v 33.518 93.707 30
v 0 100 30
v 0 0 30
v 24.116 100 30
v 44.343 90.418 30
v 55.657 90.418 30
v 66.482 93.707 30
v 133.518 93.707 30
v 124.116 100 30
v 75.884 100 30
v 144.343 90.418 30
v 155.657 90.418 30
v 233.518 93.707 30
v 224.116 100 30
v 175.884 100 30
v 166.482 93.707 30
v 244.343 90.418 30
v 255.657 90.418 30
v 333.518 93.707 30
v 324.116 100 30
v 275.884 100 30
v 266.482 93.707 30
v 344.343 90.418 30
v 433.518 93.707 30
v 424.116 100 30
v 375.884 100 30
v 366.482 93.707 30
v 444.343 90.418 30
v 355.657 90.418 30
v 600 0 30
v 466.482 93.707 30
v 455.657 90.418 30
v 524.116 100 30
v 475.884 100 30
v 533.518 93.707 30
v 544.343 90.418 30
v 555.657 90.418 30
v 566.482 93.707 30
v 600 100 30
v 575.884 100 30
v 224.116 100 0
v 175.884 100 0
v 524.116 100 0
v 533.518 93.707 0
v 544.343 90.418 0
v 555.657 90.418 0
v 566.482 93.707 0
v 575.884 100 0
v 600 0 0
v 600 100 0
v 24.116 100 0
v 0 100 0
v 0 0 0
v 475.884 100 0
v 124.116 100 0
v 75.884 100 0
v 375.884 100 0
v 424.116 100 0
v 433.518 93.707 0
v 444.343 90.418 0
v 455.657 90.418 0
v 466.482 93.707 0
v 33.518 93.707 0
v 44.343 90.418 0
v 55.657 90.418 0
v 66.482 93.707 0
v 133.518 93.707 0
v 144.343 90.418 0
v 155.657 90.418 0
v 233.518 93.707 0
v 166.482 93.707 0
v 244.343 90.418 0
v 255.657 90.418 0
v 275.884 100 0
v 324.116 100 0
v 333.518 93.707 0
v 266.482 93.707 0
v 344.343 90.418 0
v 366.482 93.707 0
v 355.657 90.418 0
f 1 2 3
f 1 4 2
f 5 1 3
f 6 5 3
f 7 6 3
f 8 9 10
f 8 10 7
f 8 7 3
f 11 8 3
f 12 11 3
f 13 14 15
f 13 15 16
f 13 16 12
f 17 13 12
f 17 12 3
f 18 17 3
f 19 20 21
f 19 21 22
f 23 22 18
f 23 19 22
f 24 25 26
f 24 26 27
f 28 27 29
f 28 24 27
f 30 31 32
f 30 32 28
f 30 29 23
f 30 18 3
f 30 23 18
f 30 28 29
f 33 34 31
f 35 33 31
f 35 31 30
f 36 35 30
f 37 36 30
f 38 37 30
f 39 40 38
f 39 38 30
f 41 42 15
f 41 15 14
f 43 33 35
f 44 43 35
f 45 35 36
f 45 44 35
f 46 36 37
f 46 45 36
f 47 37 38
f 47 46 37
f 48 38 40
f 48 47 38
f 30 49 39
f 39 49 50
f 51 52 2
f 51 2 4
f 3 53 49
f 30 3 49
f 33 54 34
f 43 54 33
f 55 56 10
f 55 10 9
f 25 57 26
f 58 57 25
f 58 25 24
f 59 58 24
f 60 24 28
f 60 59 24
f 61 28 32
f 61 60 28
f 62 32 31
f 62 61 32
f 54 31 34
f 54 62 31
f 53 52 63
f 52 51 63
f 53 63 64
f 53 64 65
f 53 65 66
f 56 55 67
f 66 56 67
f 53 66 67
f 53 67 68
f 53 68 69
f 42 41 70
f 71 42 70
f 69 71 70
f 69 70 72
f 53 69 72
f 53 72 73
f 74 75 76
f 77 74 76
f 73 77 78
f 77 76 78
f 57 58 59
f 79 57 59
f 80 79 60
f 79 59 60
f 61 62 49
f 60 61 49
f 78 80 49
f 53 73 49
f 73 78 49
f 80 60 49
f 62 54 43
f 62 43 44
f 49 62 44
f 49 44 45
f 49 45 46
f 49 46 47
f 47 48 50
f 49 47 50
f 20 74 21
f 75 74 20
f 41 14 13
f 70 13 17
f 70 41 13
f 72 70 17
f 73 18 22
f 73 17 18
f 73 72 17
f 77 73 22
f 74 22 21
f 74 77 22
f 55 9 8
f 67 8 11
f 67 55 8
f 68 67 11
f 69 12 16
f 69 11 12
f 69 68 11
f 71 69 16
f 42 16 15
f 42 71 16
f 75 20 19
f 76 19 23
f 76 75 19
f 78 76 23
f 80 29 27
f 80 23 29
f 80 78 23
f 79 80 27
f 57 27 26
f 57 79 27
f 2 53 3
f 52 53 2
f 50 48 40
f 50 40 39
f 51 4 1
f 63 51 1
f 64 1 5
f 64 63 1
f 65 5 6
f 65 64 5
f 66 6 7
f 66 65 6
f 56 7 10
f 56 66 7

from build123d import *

# Parameters (mm, degrees)
ESQUISSE1_W                  = 600
ESQUISSE1_H                  = 100
BOSS_EXTRU_1_DEPTH           = 30
ENL_V_MAT_EXTRU_1_DEPTH      = 610.015599143
ENL_V_MAT_EXTRU_1_DEPTH_BACK = 610.015599143
ESQUISSE2_R                  = 38.5


with BuildPart() as part:
    # Esquisse1 → Boss.-Extru.1 (new body)
    with BuildSketch(Plane.XY):
        with Locations((300, 50)):
            Rectangle(ESQUISSE1_W, ESQUISSE1_H)
    extrude(amount=BOSS_EXTRU_1_DEPTH)

    # Esquisse2 → Enlèv. mat.-Extru.1 (cut, two sides: drawn at the far end of the back side and taken through both)
    with BuildSketch(Plane.XY.offset(30).offset(-ENL_V_MAT_EXTRU_1_DEPTH_BACK)):
        with Locations((50, 128.5)):
            Circle(ESQUISSE2_R)
        with Locations((150, 128.5)):
            Circle(ESQUISSE2_R)
        with Locations((250, 128.5)):
            Circle(ESQUISSE2_R)
        with Locations((350, 128.5)):
            Circle(ESQUISSE2_R)
        with Locations((450, 128.5)):
            Circle(ESQUISSE2_R)
        with Locations((550, 128.5)):
            Circle(ESQUISSE2_R)
    extrude(amount=ENL_V_MAT_EXTRU_1_DEPTH + ENL_V_MAT_EXTRU_1_DEPTH_BACK, mode=Mode.SUBTRACT)


solid = part.part
